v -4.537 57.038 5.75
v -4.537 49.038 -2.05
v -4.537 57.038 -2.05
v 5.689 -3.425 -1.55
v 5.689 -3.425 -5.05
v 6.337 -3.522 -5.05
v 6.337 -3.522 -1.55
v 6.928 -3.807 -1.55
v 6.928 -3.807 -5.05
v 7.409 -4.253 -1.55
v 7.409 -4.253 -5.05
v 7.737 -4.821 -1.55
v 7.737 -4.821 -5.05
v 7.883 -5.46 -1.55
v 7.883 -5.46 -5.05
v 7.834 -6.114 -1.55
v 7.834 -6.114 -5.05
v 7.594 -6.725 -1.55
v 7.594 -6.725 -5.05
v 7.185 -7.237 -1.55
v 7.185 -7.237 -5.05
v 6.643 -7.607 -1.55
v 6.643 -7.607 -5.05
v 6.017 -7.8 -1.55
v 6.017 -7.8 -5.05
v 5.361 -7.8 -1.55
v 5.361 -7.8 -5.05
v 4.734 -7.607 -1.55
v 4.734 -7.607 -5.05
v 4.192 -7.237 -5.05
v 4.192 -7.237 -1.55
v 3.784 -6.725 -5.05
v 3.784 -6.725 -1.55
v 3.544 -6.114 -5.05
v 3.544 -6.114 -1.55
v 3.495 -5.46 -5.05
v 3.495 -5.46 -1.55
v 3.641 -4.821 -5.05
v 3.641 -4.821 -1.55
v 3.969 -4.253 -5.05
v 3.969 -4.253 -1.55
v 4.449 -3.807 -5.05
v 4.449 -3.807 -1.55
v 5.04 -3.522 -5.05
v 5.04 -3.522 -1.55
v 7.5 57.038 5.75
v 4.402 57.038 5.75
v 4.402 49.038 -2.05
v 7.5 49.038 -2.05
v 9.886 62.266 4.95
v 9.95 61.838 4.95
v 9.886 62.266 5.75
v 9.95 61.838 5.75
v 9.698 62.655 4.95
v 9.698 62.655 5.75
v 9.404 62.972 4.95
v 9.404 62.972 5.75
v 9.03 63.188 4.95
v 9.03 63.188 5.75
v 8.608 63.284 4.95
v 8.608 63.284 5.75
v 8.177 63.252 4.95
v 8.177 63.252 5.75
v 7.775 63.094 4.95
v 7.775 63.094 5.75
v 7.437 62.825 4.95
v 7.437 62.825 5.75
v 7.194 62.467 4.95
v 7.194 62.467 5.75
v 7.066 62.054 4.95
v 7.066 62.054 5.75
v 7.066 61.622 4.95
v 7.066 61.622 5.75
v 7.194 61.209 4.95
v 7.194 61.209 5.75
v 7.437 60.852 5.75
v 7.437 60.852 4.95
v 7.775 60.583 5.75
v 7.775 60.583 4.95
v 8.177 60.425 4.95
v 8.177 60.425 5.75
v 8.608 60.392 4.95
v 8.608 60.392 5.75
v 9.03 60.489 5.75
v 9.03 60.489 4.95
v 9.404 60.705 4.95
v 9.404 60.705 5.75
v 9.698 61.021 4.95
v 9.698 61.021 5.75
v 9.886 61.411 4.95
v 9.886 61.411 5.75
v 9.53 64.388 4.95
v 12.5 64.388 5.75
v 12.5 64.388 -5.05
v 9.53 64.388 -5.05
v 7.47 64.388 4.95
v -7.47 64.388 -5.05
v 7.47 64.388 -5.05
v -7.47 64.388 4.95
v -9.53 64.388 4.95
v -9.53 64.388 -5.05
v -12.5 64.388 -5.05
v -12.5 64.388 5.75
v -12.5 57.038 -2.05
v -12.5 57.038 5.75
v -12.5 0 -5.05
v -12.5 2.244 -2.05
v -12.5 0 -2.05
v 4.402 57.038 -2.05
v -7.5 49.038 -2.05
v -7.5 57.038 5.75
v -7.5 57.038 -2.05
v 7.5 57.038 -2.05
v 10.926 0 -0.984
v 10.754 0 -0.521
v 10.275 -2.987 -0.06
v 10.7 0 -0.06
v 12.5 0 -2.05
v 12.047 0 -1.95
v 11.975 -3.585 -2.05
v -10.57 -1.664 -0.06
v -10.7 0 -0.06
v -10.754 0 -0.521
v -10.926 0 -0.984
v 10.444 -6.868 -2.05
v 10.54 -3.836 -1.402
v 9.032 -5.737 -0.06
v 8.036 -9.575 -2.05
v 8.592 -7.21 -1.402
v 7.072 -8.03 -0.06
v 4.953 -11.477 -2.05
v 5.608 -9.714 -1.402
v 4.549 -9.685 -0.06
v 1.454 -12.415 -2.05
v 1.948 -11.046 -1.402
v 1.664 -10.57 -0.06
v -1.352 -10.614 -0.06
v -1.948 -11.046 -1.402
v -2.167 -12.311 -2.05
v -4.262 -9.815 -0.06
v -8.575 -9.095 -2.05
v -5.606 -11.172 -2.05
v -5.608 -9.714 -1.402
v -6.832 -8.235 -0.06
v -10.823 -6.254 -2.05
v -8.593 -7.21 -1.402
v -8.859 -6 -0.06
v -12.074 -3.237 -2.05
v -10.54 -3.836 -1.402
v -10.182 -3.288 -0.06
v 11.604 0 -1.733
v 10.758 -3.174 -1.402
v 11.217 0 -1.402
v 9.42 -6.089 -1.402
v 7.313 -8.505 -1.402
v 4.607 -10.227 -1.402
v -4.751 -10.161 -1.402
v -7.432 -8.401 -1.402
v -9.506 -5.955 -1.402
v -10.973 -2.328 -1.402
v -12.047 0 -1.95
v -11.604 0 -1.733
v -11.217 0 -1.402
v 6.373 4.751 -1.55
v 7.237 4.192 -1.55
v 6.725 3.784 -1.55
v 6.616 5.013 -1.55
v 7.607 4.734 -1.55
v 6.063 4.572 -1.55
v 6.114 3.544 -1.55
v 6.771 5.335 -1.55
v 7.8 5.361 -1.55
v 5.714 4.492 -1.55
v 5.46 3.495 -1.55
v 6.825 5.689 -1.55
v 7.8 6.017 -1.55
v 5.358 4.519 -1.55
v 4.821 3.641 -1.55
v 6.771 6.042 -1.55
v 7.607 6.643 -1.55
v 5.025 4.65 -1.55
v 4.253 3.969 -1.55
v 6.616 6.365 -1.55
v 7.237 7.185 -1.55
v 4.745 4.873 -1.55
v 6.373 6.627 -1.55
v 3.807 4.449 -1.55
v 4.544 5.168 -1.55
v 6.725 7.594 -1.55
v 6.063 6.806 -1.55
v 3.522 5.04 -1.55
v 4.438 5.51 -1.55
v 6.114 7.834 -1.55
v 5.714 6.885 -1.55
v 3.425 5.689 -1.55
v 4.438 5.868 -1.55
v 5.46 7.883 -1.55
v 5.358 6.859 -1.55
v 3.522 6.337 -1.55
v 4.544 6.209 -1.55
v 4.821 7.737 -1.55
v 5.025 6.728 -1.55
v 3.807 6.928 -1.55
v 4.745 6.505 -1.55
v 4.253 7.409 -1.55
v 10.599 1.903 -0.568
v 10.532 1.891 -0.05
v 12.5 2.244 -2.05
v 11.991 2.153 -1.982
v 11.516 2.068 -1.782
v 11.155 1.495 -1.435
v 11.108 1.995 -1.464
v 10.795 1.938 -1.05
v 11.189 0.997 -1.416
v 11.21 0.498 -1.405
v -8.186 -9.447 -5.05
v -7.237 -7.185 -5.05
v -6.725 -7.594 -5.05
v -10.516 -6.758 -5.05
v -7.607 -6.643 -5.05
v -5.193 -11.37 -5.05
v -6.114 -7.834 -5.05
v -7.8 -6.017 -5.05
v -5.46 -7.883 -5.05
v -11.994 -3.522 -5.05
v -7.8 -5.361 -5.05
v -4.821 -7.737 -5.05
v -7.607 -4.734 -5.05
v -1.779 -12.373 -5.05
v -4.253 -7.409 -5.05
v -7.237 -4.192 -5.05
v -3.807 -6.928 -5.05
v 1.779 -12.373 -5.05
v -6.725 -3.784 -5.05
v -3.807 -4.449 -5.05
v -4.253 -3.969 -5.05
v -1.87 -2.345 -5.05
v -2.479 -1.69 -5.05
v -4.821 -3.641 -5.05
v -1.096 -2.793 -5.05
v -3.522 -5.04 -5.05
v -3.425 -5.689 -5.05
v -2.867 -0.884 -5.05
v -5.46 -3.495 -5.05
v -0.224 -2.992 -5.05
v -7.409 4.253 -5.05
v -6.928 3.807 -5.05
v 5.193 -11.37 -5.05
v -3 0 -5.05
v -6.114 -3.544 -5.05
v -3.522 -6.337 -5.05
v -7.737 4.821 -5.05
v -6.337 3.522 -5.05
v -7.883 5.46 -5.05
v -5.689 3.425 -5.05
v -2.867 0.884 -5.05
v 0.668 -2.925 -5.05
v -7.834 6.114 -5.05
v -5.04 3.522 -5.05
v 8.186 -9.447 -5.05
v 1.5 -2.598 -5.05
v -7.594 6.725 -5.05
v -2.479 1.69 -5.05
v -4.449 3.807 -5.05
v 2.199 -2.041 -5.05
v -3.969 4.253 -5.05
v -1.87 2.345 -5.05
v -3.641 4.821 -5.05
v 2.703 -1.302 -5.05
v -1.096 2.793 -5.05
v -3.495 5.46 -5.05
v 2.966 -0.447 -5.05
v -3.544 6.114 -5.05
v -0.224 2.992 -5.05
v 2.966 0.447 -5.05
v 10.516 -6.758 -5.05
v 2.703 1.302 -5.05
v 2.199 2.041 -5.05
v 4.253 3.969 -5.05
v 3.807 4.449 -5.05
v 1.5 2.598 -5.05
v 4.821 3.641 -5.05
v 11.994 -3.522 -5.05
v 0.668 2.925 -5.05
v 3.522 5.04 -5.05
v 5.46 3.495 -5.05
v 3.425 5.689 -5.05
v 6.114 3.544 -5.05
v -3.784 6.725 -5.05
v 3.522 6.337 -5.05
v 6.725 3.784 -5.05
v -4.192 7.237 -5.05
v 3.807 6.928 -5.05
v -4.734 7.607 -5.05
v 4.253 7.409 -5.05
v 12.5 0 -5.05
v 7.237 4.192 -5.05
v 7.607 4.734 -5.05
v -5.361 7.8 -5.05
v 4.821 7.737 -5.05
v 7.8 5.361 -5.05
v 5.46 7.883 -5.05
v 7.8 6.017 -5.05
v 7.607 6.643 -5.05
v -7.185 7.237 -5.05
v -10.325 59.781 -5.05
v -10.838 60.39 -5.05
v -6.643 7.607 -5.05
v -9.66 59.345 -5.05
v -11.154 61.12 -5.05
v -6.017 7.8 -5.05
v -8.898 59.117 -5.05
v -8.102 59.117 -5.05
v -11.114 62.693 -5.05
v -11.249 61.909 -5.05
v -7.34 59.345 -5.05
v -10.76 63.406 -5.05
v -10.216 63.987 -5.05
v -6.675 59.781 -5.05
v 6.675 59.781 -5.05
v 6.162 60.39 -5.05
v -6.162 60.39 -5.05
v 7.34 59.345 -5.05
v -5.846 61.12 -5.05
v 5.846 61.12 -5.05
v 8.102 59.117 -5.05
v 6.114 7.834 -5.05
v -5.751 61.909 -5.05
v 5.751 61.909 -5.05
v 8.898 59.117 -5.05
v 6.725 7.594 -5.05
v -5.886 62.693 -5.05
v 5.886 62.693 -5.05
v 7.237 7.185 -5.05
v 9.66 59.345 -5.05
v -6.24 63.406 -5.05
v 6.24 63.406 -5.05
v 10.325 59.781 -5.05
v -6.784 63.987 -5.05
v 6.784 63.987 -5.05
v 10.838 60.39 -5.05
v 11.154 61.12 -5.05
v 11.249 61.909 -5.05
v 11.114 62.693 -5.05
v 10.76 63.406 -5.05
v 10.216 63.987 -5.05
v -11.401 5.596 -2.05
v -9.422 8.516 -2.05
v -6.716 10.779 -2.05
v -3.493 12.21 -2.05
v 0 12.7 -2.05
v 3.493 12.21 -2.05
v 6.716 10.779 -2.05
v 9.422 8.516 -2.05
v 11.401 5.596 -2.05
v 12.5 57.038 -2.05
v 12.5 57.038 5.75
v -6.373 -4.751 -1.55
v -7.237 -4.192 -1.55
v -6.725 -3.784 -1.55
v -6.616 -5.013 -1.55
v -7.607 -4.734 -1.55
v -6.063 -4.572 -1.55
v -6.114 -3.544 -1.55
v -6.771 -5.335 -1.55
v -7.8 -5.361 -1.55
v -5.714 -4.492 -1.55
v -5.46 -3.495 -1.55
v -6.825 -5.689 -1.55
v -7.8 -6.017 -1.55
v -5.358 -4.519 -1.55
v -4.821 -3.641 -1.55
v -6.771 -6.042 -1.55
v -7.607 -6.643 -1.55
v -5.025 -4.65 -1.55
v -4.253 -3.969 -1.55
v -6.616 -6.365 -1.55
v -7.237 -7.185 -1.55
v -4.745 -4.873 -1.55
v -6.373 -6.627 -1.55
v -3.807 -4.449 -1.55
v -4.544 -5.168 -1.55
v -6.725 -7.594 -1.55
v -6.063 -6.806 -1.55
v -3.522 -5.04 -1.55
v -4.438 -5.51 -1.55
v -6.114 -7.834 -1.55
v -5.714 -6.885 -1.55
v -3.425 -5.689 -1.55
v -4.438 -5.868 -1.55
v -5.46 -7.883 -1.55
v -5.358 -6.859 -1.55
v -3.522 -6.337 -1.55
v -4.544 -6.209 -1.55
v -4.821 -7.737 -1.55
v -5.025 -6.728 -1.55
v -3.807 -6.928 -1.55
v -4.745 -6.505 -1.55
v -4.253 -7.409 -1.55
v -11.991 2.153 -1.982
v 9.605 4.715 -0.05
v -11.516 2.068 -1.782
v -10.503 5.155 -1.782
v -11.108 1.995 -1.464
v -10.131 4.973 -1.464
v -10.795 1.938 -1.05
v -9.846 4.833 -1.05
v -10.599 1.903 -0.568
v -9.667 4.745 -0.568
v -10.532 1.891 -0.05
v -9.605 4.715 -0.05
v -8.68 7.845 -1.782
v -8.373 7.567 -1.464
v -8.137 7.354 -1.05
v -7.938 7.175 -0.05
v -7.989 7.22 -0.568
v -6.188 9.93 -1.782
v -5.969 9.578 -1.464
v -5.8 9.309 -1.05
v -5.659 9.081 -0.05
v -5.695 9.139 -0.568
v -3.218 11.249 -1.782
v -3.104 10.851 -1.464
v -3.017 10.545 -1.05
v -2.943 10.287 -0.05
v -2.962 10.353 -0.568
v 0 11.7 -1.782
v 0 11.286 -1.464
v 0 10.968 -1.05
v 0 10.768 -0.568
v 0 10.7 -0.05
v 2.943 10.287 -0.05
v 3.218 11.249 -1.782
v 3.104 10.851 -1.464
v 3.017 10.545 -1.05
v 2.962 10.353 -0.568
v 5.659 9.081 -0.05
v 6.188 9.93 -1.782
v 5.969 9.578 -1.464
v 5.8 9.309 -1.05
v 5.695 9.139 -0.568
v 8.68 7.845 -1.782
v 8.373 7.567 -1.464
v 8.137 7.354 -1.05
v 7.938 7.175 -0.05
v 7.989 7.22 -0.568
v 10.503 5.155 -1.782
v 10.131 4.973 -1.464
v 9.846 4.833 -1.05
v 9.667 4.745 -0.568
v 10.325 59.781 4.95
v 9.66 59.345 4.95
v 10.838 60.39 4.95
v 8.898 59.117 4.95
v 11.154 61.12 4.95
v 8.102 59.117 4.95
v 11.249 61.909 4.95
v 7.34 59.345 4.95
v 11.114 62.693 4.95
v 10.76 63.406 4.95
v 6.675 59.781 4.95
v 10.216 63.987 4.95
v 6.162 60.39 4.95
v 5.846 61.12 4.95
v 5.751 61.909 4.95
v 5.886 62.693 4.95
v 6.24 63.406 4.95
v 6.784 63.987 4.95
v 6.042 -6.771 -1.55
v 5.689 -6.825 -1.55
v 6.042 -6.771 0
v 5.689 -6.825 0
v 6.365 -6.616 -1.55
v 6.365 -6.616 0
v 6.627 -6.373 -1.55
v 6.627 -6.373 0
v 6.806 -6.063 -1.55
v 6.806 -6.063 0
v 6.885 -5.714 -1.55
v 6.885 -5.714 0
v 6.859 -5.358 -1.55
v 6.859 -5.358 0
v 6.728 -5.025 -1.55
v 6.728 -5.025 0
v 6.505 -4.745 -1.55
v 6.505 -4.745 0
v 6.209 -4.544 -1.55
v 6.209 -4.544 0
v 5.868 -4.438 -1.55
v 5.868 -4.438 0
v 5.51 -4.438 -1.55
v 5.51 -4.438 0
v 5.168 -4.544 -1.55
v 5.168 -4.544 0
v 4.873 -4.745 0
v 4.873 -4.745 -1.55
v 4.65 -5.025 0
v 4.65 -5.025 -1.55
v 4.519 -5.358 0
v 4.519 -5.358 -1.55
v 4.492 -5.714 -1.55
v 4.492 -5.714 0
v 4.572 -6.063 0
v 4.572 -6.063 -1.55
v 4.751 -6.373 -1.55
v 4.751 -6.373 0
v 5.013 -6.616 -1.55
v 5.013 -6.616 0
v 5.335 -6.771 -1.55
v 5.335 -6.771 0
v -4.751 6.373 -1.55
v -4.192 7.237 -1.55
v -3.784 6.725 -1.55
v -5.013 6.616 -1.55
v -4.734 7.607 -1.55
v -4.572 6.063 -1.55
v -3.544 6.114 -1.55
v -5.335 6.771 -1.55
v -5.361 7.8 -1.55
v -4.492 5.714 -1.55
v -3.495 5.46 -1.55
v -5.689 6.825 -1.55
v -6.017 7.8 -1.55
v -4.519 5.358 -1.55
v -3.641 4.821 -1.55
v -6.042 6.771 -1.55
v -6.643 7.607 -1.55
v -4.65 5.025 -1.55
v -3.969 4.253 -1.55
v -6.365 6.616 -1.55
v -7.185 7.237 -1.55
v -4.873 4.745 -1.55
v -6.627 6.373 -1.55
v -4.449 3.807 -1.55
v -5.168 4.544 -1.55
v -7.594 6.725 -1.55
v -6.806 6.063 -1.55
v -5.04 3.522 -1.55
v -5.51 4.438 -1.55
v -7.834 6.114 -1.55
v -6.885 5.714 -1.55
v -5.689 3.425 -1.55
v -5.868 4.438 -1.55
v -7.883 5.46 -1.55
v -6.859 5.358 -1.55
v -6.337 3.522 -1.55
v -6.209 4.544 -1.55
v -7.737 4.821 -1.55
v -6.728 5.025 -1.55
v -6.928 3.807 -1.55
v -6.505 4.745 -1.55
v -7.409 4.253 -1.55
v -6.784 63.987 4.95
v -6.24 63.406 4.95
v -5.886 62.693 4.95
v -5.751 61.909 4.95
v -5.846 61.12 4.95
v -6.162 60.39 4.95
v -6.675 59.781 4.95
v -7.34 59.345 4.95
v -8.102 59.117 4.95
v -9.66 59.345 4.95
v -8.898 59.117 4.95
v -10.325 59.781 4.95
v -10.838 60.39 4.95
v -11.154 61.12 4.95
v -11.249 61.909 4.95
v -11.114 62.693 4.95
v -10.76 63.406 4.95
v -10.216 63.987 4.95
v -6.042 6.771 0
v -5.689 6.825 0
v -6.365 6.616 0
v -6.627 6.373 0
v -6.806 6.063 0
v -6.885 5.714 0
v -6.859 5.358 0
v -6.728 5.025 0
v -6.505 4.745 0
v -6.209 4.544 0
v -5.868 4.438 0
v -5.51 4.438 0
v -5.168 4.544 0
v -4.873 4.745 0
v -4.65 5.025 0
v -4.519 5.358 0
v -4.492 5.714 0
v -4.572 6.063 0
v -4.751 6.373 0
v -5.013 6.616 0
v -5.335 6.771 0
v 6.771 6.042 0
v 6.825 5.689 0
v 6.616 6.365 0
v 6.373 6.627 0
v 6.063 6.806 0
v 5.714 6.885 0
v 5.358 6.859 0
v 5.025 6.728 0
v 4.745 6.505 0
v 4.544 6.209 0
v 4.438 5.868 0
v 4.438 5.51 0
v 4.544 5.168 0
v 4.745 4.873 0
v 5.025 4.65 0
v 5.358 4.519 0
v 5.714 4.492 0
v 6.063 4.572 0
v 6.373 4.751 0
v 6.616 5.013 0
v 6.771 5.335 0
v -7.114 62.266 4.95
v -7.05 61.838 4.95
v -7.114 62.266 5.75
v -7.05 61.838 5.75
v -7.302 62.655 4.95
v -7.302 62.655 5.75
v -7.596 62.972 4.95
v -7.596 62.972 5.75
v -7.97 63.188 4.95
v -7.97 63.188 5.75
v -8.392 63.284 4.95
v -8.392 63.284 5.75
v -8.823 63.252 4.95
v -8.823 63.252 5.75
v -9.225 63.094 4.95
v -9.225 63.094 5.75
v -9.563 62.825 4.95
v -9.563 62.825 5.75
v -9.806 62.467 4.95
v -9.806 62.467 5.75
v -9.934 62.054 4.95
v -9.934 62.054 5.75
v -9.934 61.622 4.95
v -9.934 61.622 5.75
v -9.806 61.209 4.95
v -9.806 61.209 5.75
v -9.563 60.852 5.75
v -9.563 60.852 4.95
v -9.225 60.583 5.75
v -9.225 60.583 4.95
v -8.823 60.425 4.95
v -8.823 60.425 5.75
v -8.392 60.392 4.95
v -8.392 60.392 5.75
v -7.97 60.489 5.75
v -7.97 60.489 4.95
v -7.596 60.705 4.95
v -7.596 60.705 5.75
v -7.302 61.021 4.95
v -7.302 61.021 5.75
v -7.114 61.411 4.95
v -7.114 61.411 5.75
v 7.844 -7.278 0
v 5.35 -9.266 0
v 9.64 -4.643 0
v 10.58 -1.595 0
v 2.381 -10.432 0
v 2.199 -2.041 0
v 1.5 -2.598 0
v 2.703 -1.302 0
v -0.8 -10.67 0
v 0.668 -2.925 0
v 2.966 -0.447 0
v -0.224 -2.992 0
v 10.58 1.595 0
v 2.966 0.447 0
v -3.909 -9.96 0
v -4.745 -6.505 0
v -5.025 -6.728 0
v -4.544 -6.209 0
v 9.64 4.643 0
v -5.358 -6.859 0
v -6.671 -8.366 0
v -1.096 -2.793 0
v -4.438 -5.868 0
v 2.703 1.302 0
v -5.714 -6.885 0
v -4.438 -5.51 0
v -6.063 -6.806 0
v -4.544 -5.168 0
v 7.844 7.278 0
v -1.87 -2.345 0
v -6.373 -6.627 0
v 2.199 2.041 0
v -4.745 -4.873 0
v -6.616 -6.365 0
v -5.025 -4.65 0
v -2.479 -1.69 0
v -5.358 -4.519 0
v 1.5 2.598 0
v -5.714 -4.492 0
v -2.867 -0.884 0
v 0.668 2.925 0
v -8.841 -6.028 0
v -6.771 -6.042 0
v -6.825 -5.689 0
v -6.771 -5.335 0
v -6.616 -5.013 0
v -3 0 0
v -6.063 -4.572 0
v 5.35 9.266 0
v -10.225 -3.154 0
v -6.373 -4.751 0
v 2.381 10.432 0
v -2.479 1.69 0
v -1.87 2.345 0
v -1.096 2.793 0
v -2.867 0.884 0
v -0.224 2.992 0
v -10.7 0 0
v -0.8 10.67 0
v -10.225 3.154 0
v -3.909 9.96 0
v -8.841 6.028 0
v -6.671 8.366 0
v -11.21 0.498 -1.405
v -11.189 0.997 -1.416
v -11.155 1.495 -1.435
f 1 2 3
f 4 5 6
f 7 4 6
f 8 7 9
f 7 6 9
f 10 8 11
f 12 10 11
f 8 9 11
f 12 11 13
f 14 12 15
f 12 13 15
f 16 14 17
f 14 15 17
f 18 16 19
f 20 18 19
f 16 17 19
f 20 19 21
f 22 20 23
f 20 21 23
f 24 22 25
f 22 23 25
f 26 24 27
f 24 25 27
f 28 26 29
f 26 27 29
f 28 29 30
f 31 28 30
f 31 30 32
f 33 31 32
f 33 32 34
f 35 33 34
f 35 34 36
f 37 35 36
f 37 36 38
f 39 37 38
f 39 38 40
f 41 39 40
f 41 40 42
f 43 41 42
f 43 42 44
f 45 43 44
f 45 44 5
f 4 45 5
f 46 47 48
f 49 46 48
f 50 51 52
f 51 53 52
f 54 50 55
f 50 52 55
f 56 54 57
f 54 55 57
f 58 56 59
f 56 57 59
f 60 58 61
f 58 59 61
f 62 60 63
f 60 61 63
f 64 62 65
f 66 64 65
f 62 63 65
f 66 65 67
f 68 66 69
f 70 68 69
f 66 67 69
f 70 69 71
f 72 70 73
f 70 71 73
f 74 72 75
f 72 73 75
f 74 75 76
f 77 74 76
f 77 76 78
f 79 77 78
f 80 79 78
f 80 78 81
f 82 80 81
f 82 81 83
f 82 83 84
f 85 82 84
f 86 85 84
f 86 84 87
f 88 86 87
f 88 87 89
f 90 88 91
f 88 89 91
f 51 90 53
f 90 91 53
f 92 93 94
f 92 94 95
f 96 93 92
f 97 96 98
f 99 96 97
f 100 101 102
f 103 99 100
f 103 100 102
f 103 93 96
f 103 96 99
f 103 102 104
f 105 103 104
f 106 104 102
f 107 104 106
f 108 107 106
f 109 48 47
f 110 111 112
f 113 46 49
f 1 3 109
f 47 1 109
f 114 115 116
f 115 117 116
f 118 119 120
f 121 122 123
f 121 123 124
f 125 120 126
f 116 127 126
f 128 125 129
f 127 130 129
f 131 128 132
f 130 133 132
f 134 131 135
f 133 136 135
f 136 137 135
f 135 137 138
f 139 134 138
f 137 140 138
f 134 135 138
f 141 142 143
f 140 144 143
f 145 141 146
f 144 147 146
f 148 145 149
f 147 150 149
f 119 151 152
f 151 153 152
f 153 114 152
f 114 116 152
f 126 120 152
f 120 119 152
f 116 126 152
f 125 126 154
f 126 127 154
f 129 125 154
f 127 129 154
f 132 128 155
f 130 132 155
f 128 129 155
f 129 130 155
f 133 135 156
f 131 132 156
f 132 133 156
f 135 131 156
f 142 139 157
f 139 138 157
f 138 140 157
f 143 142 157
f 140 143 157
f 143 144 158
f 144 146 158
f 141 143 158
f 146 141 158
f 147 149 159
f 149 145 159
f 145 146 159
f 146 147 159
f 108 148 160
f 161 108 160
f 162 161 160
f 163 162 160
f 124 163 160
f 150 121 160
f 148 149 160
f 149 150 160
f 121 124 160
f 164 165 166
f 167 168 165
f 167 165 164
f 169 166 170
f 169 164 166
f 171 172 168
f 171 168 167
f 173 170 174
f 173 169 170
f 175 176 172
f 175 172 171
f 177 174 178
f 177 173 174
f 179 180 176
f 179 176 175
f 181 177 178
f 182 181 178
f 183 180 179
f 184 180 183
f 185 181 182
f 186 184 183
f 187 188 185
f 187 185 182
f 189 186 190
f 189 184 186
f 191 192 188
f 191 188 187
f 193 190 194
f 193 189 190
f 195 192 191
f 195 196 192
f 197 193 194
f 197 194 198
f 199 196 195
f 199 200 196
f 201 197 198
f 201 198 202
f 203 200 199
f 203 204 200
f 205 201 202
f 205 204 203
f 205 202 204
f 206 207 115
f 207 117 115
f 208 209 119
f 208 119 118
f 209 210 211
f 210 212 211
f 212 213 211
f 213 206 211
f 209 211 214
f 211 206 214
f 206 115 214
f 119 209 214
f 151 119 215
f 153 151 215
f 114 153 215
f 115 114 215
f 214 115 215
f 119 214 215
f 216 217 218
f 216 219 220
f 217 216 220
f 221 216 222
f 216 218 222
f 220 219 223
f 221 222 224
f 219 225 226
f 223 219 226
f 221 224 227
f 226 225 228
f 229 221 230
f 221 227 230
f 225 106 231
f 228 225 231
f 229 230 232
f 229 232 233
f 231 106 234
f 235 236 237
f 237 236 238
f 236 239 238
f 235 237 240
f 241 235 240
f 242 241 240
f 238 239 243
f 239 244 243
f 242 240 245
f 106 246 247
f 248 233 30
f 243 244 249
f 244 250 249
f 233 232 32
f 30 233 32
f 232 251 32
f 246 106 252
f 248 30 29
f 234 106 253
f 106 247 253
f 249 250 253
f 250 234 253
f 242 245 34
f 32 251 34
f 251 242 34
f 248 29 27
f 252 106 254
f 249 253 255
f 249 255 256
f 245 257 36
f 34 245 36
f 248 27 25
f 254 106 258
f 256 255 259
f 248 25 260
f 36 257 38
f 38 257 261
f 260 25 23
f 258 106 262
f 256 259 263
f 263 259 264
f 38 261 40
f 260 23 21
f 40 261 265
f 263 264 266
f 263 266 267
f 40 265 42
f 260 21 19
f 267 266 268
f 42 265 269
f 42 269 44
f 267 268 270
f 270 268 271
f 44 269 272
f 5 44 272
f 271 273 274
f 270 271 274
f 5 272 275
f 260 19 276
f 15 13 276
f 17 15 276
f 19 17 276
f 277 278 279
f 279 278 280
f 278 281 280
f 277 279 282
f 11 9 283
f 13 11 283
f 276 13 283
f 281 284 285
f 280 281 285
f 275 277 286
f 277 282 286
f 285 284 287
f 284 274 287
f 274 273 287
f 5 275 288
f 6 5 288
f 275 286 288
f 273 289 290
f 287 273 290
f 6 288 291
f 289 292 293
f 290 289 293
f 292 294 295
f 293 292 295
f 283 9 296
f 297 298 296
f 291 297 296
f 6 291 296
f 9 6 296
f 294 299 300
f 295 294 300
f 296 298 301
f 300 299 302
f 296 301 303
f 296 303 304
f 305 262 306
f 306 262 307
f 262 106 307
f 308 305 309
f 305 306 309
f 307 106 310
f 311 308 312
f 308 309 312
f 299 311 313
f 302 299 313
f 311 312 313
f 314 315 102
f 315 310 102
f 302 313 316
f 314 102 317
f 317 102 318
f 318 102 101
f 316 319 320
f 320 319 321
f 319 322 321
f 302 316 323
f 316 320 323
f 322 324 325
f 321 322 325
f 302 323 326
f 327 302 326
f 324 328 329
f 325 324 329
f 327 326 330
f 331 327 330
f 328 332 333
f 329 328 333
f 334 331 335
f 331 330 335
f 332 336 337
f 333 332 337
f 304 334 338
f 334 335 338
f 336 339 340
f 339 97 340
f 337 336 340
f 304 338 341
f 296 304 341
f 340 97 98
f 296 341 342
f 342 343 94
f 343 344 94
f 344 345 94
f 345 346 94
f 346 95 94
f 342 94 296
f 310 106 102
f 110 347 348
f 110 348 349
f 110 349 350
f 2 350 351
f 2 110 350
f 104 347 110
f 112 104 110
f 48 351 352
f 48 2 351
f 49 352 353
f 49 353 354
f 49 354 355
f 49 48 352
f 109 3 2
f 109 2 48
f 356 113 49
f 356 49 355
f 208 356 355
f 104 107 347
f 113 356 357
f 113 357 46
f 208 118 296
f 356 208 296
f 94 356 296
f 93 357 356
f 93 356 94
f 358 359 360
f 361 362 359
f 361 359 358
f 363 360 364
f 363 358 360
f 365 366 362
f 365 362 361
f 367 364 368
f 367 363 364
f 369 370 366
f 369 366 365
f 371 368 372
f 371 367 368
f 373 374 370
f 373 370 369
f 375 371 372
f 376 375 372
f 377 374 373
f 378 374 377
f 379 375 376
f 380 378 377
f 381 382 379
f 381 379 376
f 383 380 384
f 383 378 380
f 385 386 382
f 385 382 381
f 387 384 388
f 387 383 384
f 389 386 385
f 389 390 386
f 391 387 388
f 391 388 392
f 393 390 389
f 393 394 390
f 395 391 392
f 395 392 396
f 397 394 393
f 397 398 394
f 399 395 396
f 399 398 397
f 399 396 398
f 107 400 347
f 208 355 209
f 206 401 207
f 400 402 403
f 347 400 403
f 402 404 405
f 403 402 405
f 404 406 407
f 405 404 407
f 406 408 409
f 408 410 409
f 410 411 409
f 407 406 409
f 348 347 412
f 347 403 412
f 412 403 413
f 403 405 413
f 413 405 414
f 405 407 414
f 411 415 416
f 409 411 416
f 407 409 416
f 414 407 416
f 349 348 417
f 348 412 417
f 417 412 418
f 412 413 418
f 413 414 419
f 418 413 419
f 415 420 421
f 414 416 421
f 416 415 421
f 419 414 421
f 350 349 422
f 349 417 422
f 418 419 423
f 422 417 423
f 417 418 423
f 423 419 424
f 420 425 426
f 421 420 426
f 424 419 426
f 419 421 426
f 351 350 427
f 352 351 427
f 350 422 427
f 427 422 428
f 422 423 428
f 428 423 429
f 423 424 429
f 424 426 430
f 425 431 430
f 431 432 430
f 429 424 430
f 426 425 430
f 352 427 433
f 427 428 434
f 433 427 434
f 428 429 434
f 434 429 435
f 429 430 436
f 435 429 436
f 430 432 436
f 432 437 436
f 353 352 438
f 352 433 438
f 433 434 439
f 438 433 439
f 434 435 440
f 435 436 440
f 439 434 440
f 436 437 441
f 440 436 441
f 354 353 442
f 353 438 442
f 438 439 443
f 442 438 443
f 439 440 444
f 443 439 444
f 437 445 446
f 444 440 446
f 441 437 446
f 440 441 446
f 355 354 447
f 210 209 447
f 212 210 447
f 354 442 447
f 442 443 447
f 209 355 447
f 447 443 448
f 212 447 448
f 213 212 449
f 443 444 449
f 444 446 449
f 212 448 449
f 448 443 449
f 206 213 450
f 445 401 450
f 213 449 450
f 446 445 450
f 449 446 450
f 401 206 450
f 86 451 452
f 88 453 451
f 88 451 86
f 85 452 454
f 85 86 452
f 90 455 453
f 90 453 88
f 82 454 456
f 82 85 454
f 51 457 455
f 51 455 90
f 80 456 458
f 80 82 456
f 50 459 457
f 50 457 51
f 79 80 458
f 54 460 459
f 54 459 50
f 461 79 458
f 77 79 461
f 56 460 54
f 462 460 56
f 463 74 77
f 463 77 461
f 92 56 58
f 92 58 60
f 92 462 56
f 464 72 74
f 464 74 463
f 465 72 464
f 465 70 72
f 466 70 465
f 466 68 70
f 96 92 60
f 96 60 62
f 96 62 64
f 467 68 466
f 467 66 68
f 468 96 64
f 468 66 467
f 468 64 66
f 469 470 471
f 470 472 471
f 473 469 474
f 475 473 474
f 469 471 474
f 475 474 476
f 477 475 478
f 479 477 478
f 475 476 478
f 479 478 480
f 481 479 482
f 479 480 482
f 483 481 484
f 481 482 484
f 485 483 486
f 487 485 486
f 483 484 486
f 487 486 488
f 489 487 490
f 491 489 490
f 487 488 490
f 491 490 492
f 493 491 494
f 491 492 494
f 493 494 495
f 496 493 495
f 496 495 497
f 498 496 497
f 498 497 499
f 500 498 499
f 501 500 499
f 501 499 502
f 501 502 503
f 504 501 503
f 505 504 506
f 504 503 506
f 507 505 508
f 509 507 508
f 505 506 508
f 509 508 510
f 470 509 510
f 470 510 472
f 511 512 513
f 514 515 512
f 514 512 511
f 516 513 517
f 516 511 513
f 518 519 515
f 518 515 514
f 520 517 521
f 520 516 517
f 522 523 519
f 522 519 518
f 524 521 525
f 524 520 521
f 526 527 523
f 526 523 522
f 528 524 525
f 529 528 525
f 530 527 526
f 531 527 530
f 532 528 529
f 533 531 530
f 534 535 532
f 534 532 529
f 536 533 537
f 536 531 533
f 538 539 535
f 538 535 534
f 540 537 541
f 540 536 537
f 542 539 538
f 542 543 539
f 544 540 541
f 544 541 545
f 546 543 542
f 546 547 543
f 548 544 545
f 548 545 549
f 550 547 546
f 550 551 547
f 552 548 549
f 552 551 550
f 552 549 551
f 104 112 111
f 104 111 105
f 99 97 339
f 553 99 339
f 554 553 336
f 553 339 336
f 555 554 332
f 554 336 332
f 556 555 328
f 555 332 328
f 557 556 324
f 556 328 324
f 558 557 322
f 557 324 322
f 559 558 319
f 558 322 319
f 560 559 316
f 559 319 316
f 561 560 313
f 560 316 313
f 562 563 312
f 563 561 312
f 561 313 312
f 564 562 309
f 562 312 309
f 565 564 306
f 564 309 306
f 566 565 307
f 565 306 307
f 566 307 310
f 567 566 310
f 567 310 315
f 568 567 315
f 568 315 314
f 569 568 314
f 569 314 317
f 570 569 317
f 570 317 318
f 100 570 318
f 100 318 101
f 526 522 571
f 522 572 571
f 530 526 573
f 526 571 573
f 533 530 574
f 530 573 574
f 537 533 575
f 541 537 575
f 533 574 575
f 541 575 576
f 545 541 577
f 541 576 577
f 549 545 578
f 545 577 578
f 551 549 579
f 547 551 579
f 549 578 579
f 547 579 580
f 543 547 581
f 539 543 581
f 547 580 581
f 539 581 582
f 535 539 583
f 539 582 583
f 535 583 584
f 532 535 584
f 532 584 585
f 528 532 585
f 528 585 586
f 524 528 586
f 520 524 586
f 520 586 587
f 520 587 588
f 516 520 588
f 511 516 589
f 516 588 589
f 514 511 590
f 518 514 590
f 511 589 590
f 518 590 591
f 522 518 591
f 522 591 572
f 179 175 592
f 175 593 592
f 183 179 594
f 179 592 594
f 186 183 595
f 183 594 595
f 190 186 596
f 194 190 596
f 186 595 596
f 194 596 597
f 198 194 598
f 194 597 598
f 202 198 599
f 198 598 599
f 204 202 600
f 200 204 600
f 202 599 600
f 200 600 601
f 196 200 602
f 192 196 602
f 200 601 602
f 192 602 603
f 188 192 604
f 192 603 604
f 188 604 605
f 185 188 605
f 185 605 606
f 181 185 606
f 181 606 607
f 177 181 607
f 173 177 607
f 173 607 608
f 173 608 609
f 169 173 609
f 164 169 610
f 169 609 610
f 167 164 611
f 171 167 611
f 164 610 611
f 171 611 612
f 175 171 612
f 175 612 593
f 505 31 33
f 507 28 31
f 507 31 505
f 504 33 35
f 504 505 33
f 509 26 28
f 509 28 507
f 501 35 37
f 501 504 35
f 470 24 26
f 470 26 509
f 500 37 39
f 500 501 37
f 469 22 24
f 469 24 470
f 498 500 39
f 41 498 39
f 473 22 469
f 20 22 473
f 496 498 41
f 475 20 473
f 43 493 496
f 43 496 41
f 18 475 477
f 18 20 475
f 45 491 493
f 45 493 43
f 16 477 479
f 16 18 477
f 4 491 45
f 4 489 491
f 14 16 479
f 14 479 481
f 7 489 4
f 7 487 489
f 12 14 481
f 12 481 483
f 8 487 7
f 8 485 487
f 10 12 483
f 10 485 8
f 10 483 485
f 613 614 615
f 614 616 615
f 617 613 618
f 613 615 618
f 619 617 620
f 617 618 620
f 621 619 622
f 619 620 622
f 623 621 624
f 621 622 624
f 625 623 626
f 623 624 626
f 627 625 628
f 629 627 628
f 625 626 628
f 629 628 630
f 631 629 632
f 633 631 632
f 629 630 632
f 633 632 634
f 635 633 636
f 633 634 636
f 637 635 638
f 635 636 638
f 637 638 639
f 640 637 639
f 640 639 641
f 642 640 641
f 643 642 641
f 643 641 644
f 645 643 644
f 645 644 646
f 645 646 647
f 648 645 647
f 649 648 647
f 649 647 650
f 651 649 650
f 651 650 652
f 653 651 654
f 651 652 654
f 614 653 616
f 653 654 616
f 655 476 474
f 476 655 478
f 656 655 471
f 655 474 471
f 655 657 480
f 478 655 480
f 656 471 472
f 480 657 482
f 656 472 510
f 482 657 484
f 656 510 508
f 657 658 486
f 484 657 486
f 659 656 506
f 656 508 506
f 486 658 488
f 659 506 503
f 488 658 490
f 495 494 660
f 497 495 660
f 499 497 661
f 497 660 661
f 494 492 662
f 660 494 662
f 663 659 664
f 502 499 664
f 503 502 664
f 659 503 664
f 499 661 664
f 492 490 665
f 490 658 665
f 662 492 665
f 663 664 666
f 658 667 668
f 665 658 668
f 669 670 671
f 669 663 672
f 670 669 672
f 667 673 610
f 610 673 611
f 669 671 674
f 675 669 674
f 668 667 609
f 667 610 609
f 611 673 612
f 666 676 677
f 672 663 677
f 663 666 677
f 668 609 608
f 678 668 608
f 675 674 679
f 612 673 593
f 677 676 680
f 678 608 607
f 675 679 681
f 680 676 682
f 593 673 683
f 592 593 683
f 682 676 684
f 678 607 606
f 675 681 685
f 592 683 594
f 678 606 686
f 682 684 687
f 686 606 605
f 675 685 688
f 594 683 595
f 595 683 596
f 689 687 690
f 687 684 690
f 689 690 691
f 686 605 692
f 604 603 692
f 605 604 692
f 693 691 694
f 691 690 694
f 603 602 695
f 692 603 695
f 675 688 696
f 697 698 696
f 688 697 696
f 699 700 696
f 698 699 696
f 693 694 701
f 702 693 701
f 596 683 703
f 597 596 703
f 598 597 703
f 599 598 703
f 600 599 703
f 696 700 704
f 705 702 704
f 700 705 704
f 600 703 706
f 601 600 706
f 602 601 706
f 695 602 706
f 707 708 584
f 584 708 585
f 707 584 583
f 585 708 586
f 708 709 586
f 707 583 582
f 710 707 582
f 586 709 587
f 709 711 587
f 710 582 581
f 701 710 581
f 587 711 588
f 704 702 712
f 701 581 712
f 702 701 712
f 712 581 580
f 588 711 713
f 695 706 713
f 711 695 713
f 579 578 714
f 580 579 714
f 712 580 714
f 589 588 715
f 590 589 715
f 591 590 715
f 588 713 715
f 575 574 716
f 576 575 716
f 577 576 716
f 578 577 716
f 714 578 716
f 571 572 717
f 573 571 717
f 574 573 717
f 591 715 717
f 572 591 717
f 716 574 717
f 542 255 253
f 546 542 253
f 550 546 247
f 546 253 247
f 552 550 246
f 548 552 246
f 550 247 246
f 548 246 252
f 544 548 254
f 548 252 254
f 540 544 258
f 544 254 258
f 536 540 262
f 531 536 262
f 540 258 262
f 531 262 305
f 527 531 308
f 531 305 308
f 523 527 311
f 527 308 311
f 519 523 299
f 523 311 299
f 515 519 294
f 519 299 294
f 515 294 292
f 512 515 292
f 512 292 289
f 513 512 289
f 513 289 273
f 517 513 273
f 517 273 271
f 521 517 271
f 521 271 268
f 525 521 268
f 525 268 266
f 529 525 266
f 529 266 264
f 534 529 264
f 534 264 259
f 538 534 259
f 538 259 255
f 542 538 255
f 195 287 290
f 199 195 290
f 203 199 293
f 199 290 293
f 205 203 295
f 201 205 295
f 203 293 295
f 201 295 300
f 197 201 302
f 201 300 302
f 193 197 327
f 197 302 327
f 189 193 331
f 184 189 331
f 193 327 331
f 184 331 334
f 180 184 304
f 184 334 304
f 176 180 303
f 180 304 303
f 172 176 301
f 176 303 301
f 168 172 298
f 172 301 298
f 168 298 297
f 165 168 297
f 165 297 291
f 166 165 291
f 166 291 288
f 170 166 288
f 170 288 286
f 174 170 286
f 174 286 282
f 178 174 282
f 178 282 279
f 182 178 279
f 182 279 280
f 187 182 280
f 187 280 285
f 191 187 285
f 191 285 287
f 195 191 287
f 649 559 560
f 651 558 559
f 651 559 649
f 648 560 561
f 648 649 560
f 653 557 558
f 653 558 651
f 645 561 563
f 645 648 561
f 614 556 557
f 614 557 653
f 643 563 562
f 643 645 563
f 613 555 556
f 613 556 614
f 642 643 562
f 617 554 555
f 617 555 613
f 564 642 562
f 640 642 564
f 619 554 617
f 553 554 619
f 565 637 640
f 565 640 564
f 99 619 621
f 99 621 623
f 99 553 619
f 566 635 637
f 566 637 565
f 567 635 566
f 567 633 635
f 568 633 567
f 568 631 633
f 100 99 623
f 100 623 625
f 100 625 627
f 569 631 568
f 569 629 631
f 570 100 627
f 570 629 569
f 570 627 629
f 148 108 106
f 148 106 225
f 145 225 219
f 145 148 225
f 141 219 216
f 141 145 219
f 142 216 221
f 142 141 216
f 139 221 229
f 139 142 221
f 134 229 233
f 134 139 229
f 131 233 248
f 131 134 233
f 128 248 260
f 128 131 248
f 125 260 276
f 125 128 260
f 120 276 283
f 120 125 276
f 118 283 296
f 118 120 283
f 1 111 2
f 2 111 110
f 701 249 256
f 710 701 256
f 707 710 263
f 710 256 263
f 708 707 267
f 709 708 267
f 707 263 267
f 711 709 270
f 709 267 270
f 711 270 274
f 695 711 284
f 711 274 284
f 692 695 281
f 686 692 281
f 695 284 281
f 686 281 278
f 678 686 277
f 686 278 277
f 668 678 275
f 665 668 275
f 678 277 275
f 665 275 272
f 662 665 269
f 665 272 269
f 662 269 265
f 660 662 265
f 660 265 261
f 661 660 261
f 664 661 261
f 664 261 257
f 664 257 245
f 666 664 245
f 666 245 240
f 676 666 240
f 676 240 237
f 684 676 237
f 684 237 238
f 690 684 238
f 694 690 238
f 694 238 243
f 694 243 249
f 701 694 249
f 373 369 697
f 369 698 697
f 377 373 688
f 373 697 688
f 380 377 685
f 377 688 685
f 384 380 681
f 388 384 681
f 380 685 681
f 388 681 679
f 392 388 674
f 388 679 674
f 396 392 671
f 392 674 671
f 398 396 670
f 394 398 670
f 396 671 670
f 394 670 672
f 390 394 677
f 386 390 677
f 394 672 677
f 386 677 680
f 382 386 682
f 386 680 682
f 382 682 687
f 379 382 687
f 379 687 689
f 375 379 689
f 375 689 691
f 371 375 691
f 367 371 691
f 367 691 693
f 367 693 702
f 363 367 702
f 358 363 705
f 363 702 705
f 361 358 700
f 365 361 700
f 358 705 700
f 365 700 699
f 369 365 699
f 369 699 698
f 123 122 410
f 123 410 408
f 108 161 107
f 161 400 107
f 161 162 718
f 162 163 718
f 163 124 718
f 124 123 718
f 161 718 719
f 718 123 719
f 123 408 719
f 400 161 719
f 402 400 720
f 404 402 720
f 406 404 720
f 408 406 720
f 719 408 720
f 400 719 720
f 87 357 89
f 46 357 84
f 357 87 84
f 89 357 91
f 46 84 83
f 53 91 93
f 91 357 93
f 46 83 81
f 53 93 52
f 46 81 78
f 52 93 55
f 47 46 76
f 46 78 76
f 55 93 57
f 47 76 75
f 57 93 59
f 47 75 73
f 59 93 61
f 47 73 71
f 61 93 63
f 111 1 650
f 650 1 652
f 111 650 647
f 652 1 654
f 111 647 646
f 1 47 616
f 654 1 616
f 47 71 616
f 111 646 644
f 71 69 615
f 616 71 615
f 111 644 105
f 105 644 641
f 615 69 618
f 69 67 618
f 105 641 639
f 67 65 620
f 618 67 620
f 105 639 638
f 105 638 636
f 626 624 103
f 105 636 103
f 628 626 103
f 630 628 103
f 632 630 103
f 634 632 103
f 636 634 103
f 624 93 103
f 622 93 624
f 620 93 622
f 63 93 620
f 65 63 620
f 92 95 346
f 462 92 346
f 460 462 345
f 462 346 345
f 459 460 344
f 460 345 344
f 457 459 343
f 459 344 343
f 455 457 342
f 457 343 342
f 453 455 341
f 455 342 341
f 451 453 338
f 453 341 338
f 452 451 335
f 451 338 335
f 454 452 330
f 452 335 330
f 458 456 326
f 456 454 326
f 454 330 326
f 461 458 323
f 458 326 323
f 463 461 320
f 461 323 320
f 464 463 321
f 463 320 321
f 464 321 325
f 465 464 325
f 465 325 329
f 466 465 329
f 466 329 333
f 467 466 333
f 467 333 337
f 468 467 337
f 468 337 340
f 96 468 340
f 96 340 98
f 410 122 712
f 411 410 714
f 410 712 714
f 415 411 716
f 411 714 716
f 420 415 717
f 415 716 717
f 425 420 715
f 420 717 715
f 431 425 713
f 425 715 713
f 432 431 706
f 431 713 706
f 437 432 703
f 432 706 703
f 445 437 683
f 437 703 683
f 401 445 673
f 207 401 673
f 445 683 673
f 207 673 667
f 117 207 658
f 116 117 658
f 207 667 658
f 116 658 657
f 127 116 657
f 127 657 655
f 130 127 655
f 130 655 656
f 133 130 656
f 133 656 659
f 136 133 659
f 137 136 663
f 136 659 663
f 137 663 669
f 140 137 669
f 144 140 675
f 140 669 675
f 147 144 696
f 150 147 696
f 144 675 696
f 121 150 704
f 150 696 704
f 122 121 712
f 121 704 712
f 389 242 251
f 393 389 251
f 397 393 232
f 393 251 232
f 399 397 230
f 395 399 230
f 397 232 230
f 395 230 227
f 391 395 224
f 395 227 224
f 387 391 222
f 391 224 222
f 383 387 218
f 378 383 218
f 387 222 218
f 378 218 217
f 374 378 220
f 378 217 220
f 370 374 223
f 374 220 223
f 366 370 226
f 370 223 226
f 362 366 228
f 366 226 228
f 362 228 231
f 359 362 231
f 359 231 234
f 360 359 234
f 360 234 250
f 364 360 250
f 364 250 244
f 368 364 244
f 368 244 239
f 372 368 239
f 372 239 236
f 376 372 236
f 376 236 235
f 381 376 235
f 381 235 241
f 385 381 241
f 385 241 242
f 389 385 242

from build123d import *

# Parameters (mm, degrees)
ESBO_O1_R                                            = 10.7
RESSALTO_EXTRUS_O1_DEPTH                             = 2.05
RESSALTO_EXTRUS_O2_DEPTH                             = 3
ESBO_O4_W                                            = 25
ESBO_O4_H                                            = 7.35
RESSALTO_EXTRUS_O3_DEPTH                             = 10.8
REBAIXO_PARA_SHCS_M2_51_D                            = 2.9
REBAIXO_PARA_SHCS_M2_51_CBORE_D                      = 5.5
REBAIXO_PARA_SHCS_M2_51_CBORE_DEPTH                  = 10
REBAIXO_PARA_PARAFUSO_COM_CABE_A_REDONDA_D           = 2.4
REBAIXO_PARA_PARAFUSO_COM_CABE_A_REDONDA_CBORE_D     = 4.4
REBAIXO_PARA_PARAFUSO_COM_CABE_A_REDONDA_CBORE_DEPTH = 3.5
PADR_OCIRCULAR1_COUNT                                = 4
NERVURA1_REACH                                       = 67.842
ESBO_O5_WALL_W                                       = 144.857085312
ESBO_O5_WALL_H                                       = 15
CORTE_EXTRUS_O1_REACH                                = 68.053
ESBO_O6_W                                            = 8.93885445
ESBO_O6_H                                            = 8
CORTE_EXTRUS_O2_REACH                                = 68.474
ESBO_O7_R                                            = 3
FILETE1_R                                            = 2


with BuildPart() as part:
    # Esboço1 → Ressalto-extrusão1 (new body)
    with BuildSketch(Plane(origin=(0, 0, 0), x_dir=(-1, 0, 0), z_dir=(0, 0, -1))):
        Circle(ESBO_O1_R)
    extrude(amount=RESSALTO_EXTRUS_O1_DEPTH)

    # Esboço2 → Ressalto-extrusão2 (add)
    with BuildSketch(Plane(origin=(0, 0, -2.05), x_dir=(-1, 0, 0), z_dir=(0, 0, -1))):
        with BuildLine():
            Line((-12.5, 64.388275999), (12.5, 64.388275999))
            Line((12.5, 64.388275999), (12.5, 0))
            ThreePointArc((12.5, 0), (0, -12.5), (-12.5, 0))
            Line((-12.5, 0), (-12.5, 64.388275999))
        make_face()
    extrude(amount=RESSALTO_EXTRUS_O2_DEPTH)

    # Esboço4 → Ressalto-extrusão3 (add)
    with BuildSketch(Plane(origin=(0, 0, -5.05), x_dir=(-1, 0, 0), z_dir=(0, 0, -1))):
        with Locations((0, 60.713275999)):
            Rectangle(ESBO_O4_W, ESBO_O4_H)
    extrude(amount=-RESSALTO_EXTRUS_O3_DEPTH)

    # Rebaixo para SHCS M2.51 (through all)
    with Locations(Plane(origin=(0, 0, -5.05), x_dir=(-1, 0, 0), z_dir=(0, 0, -1))):
        with Locations((-8.5, 61.838275999), (8.5, 61.838275999)):
            CounterBoreHole(REBAIXO_PARA_SHCS_M2_51_D / 2, REBAIXO_PARA_SHCS_M2_51_CBORE_D / 2, REBAIXO_PARA_SHCS_M2_51_CBORE_DEPTH)

    # Rebaixo para parafuso com cabeça redonda de M21 (through all)
    with Locations(Plane(origin=(0, 0, -5.05), x_dir=(-1, 0, 0), z_dir=(0, 0, -1))):
        with Locations((-5.624741587, 5.688785642)):
            rebaixo_para_parafuso_com_cabe_a_redonda = CounterBoreHole(REBAIXO_PARA_PARAFUSO_COM_CABE_A_REDONDA_D / 2, REBAIXO_PARA_PARAFUSO_COM_CABE_A_REDONDA_CBORE_D / 2, REBAIXO_PARA_PARAFUSO_COM_CABE_A_REDONDA_CBORE_DEPTH)

    # PadrãoCircular1: Rebaixo para parafuso com cabeça redonda de M21 ×4 about axis
    padr_ocircular1_axis = Axis((0, 0, 0), (0, 0, 1))
    for i in range(1, PADR_OCIRCULAR1_COUNT):
        add(rebaixo_para_parafuso_com_cabe_a_redonda.rotate(padr_ocircular1_axis, i * 360 / PADR_OCIRCULAR1_COUNT), mode=Mode.SUBTRACT)

    # Esboço5 wall → Nervura1 (add, up to next)
    with BuildSketch(Plane(origin=(0, 53.038275999, 1.85), x_dir=(0, -0.71600013962, -0.69810013613), z_dir=(0, 0.69810013613, -0.71600013962)), mode=Mode.PRIVATE) as nervura1_sk1:
        Rectangle(ESBO_O5_WALL_W, ESBO_O5_WALL_H)
    nervura1_tool1 = extrude(nervura1_sk1.sketch, amount=NERVURA1_REACH, mode=Mode.PRIVATE) - part.part
    add(nervura1_tool1.solids().sort_by_distance((0, 53.038275999, 1.85))[0])

    # Esboço6 → Corte-extrusão1 (cut, up to next)
    with BuildSketch(Plane.XY.offset(-2.05), mode=Mode.PRIVATE) as corte_extrus_o1_sk1:
        with Locations((-0.067802218, 53.038275999)):
            Rectangle(ESBO_O6_W, ESBO_O6_H)
    corte_extrus_o1_tool1 = extrude(corte_extrus_o1_sk1.sketch, amount=CORTE_EXTRUS_O1_REACH, mode=Mode.PRIVATE) & part.part
    add(corte_extrus_o1_tool1.solids().sort_by_distance((-0.067802, 53.038276, -2.05))[0], mode=Mode.SUBTRACT)

    # Esboço7 → Corte-extrusão2 (cut, up to next)
    with BuildSketch(Plane(origin=(0, 0, -5.05), x_dir=(-1, 0, 0), z_dir=(0, 0, -1)), mode=Mode.PRIVATE) as corte_extrus_o2_sk1:
        Circle(ESBO_O7_R)
    corte_extrus_o2_tool1 = extrude(corte_extrus_o2_sk1.sketch, amount=-CORTE_EXTRUS_O2_REACH, mode=Mode.PRIVATE) & part.part
    add(corte_extrus_o2_tool1.solids().sort_by_distance((0, 0, -5.05))[0], mode=Mode.SUBTRACT)

    # Filete1
    filete1_edges = [part.edges().sort_by_distance(p)[0] for p in [
        (10.7, 0, -2.05),
    ]]
    fillet(filete1_edges, radius=FILETE1_R - 0.0001)  # a hair under: the kernel refuses the full size


solid = part.part
